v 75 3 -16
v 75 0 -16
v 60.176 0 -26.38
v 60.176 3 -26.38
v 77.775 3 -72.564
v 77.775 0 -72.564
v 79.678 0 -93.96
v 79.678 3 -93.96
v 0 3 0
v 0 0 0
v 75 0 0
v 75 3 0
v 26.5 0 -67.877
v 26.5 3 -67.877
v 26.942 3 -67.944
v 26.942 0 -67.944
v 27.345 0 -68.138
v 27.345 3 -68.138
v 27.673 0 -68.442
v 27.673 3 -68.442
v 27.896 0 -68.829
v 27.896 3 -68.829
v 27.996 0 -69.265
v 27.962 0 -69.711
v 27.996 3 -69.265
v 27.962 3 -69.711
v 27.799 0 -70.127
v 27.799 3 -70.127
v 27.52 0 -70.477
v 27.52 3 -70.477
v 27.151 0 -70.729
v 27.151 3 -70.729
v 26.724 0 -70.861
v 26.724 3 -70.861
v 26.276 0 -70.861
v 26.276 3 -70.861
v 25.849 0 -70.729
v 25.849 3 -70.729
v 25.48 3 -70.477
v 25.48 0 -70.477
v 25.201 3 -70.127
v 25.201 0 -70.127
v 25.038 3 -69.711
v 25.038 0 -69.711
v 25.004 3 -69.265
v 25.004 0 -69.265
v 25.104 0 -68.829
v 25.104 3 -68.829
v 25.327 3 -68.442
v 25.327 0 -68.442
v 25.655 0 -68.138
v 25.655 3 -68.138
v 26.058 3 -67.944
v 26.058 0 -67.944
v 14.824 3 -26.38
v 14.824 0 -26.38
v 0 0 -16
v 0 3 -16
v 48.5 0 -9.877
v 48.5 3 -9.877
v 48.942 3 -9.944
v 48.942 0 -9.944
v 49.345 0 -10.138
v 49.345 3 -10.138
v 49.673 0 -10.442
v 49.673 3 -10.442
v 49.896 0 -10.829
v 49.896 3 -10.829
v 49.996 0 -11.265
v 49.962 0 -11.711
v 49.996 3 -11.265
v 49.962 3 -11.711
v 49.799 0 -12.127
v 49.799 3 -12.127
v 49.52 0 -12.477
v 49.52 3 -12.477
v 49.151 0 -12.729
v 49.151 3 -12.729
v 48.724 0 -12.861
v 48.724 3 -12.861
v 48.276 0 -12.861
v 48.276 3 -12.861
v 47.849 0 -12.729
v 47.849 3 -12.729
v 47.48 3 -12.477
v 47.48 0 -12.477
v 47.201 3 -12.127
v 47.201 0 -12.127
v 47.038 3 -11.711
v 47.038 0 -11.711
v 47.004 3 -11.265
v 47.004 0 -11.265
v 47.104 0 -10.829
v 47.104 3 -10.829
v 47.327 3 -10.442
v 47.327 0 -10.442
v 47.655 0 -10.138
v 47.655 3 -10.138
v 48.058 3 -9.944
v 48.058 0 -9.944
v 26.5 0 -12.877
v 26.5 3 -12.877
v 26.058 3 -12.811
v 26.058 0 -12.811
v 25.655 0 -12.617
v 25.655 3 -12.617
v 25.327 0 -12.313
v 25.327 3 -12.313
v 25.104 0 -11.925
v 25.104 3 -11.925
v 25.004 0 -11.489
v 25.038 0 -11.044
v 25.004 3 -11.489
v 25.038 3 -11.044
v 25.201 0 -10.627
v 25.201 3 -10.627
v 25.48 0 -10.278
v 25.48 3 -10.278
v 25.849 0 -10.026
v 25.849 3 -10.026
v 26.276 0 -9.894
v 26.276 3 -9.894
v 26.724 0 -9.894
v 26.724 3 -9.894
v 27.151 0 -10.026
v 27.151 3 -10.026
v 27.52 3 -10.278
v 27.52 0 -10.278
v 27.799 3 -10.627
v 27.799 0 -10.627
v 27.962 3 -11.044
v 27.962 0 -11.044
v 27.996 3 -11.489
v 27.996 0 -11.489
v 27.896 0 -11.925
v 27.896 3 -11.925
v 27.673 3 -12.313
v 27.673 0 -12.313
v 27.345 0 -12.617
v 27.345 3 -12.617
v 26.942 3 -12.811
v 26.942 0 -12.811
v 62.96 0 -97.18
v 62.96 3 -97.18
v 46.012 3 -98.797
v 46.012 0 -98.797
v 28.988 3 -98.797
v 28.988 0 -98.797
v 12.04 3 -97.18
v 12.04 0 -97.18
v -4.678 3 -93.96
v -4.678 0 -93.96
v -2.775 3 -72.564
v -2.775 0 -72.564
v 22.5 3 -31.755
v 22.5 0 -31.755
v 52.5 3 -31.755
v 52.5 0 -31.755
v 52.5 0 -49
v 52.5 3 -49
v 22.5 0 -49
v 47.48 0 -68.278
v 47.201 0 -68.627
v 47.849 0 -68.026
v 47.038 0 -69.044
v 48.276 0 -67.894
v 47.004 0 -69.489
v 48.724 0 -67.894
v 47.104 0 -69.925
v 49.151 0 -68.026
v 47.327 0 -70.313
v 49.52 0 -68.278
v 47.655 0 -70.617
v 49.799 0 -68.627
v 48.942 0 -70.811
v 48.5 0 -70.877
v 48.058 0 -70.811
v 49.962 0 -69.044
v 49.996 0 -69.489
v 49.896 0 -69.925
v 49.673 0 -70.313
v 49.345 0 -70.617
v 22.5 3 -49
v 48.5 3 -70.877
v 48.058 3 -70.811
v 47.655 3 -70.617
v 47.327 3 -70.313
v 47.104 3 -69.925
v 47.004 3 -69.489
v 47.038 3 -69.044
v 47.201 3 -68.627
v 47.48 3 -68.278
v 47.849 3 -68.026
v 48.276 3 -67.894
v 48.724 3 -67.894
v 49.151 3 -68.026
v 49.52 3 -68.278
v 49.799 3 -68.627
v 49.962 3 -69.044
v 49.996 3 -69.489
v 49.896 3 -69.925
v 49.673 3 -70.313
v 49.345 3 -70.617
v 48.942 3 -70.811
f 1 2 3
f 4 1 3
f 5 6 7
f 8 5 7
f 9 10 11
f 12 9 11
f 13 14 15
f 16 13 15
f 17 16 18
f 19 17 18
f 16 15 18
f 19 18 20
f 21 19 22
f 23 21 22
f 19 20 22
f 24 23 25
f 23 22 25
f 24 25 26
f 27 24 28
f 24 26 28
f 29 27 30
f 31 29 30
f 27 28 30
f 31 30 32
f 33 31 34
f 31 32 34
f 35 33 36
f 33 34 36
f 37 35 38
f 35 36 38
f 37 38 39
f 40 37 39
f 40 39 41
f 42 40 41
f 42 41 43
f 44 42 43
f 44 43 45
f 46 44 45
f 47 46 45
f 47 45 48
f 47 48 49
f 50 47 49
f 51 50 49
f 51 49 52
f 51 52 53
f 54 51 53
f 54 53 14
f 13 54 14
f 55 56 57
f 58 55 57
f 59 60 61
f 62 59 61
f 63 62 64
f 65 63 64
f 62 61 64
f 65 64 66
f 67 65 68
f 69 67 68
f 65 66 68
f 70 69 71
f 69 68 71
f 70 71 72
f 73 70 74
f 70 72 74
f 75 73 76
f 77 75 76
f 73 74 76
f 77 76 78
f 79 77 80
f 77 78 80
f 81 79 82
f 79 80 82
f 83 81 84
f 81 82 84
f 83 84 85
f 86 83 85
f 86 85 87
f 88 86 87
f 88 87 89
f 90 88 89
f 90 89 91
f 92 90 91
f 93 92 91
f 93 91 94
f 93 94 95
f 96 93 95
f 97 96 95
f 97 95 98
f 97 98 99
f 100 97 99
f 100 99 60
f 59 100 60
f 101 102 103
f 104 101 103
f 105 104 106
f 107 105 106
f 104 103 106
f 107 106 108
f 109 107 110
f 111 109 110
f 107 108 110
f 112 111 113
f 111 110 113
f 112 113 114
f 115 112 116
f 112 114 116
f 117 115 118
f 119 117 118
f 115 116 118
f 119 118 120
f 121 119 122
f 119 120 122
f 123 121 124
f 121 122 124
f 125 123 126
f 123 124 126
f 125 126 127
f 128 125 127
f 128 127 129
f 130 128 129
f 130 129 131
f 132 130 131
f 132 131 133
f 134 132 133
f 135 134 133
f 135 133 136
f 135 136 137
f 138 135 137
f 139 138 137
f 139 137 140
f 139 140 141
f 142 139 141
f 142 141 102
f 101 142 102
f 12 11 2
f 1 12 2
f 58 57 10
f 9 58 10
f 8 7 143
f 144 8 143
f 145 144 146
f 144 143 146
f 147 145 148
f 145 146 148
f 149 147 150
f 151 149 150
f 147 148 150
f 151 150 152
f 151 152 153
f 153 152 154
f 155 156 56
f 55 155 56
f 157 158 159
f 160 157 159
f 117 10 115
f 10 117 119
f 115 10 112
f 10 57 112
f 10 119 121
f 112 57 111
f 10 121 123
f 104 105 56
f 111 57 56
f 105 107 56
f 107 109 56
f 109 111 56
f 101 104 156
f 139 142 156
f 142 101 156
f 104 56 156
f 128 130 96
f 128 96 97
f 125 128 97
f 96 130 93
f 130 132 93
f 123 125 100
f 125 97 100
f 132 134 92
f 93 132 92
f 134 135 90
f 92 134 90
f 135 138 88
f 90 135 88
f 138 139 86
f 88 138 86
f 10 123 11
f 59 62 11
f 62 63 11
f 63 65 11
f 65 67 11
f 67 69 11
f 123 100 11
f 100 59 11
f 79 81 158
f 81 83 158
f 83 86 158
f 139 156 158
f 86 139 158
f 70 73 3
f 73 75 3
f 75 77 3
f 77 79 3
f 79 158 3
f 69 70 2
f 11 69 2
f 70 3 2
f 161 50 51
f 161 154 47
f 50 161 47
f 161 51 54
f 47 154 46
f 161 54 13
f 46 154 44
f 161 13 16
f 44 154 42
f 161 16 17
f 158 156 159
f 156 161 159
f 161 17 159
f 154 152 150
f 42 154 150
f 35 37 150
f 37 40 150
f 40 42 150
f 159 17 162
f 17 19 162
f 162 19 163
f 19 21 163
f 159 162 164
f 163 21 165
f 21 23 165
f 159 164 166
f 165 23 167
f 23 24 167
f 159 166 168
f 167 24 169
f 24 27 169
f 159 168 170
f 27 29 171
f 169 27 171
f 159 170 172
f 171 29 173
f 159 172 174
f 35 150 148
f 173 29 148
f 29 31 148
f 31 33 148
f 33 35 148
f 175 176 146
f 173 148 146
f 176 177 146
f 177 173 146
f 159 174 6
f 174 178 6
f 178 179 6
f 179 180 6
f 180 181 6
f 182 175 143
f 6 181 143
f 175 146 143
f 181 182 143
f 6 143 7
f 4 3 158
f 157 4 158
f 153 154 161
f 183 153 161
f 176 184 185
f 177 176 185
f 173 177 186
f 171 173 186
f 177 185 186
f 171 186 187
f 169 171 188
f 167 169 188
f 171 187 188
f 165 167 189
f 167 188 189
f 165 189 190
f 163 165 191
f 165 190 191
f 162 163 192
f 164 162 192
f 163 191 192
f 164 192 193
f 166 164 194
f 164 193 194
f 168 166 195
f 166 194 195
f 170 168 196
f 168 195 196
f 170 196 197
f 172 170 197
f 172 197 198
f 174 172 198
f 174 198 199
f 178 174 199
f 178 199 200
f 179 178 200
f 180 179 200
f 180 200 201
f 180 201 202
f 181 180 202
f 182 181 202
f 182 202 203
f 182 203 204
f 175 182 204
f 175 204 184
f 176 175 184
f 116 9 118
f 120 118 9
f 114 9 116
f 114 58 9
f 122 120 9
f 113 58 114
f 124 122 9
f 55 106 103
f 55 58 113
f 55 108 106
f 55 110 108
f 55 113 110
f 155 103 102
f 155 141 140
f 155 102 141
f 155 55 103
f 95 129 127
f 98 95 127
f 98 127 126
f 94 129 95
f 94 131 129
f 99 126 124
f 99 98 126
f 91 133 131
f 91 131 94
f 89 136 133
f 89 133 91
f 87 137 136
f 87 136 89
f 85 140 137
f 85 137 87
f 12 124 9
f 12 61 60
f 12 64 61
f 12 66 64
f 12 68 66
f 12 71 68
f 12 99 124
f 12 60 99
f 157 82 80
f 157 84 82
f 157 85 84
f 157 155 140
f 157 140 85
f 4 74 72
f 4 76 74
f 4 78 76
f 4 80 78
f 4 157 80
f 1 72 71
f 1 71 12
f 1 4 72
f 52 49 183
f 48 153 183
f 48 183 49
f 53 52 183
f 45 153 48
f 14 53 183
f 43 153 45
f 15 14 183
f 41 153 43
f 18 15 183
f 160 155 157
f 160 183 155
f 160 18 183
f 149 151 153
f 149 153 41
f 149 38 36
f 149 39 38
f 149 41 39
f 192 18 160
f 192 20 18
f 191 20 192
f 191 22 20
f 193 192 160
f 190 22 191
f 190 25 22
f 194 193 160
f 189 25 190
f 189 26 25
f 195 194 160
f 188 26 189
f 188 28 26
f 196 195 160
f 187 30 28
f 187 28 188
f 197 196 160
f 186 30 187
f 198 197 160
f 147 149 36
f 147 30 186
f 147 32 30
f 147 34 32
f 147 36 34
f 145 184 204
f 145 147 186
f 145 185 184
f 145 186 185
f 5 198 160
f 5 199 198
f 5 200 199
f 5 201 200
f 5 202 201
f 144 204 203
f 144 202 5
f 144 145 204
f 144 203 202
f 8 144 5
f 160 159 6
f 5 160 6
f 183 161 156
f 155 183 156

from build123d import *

# Parameters (mm, degrees)
BOSS_EXTRUDE1_DEPTH = 3
SKETCH3_R           = 1.5
CUT_EXTRUDE1_DEPTH  = 128.116518704


with BuildPart() as part:
    # Sketch2 → Boss-Extrude1 (new body)
    with BuildSketch(Plane(origin=(0, 0, 0), x_dir=(1, 0, 0), z_dir=(0, 1, 0))):
        with BuildLine():
            Line((0, 0), (75, 0))
            Line((75, 0), (75, 16))
            Line((75, 16), (60.175624146, 26.380139722))
            Line((60.175624146, 26.380139722), (52.5, 31.75466961))
            Line((52.5, 31.75466961), (52.5, 49))
            Line((52.5, 49), (77.774698645, 72.564473175))
            Line((77.774698645, 72.564473175), (79.67816092, 93.959773343))
            ThreePointArc((79.67816092, 93.959773343), (37.5, 99), (-4.67816092, 93.959773343))
            Line((-4.67816092, 93.959773343), (-2.774698645, 72.564473175))
            Line((-2.774698645, 72.564473175), (22.5, 49))
            Line((22.5, 49), (22.5, 31.75466961))
            Line((22.5, 31.75466961), (14.824375854, 26.380139722))
            Line((14.824375854, 26.380139722), (0, 16))
            Line((0, 16), (0, 0))
        make_face()
    extrude(amount=BOSS_EXTRUDE1_DEPTH)

    # Sketch3 → Cut-Extrude1 (cut, through all)
    with BuildSketch(Plane(origin=(0, 3, 0), x_dir=(1, 0, 0), z_dir=(0, 1, 0))):
        with Locations(Location((26.5, 69.377334805, 0), (0, 0, 270))):
            Circle(SKETCH3_R)
        with Locations(Location((48.5, 69.377334805, 0), (0, 0, 90))):
            Circle(SKETCH3_R)
        with Locations(Location((48.5, 11.377334805, 0), (0, 0, 270))):
            Circle(SKETCH3_R)
        with Locations(Location((26.5, 11.377334805, 0), (0, 0, 90))):
            Circle(SKETCH3_R)
    extrude(amount=-CUT_EXTRUDE1_DEPTH, mode=Mode.SUBTRACT)


solid = part.part
